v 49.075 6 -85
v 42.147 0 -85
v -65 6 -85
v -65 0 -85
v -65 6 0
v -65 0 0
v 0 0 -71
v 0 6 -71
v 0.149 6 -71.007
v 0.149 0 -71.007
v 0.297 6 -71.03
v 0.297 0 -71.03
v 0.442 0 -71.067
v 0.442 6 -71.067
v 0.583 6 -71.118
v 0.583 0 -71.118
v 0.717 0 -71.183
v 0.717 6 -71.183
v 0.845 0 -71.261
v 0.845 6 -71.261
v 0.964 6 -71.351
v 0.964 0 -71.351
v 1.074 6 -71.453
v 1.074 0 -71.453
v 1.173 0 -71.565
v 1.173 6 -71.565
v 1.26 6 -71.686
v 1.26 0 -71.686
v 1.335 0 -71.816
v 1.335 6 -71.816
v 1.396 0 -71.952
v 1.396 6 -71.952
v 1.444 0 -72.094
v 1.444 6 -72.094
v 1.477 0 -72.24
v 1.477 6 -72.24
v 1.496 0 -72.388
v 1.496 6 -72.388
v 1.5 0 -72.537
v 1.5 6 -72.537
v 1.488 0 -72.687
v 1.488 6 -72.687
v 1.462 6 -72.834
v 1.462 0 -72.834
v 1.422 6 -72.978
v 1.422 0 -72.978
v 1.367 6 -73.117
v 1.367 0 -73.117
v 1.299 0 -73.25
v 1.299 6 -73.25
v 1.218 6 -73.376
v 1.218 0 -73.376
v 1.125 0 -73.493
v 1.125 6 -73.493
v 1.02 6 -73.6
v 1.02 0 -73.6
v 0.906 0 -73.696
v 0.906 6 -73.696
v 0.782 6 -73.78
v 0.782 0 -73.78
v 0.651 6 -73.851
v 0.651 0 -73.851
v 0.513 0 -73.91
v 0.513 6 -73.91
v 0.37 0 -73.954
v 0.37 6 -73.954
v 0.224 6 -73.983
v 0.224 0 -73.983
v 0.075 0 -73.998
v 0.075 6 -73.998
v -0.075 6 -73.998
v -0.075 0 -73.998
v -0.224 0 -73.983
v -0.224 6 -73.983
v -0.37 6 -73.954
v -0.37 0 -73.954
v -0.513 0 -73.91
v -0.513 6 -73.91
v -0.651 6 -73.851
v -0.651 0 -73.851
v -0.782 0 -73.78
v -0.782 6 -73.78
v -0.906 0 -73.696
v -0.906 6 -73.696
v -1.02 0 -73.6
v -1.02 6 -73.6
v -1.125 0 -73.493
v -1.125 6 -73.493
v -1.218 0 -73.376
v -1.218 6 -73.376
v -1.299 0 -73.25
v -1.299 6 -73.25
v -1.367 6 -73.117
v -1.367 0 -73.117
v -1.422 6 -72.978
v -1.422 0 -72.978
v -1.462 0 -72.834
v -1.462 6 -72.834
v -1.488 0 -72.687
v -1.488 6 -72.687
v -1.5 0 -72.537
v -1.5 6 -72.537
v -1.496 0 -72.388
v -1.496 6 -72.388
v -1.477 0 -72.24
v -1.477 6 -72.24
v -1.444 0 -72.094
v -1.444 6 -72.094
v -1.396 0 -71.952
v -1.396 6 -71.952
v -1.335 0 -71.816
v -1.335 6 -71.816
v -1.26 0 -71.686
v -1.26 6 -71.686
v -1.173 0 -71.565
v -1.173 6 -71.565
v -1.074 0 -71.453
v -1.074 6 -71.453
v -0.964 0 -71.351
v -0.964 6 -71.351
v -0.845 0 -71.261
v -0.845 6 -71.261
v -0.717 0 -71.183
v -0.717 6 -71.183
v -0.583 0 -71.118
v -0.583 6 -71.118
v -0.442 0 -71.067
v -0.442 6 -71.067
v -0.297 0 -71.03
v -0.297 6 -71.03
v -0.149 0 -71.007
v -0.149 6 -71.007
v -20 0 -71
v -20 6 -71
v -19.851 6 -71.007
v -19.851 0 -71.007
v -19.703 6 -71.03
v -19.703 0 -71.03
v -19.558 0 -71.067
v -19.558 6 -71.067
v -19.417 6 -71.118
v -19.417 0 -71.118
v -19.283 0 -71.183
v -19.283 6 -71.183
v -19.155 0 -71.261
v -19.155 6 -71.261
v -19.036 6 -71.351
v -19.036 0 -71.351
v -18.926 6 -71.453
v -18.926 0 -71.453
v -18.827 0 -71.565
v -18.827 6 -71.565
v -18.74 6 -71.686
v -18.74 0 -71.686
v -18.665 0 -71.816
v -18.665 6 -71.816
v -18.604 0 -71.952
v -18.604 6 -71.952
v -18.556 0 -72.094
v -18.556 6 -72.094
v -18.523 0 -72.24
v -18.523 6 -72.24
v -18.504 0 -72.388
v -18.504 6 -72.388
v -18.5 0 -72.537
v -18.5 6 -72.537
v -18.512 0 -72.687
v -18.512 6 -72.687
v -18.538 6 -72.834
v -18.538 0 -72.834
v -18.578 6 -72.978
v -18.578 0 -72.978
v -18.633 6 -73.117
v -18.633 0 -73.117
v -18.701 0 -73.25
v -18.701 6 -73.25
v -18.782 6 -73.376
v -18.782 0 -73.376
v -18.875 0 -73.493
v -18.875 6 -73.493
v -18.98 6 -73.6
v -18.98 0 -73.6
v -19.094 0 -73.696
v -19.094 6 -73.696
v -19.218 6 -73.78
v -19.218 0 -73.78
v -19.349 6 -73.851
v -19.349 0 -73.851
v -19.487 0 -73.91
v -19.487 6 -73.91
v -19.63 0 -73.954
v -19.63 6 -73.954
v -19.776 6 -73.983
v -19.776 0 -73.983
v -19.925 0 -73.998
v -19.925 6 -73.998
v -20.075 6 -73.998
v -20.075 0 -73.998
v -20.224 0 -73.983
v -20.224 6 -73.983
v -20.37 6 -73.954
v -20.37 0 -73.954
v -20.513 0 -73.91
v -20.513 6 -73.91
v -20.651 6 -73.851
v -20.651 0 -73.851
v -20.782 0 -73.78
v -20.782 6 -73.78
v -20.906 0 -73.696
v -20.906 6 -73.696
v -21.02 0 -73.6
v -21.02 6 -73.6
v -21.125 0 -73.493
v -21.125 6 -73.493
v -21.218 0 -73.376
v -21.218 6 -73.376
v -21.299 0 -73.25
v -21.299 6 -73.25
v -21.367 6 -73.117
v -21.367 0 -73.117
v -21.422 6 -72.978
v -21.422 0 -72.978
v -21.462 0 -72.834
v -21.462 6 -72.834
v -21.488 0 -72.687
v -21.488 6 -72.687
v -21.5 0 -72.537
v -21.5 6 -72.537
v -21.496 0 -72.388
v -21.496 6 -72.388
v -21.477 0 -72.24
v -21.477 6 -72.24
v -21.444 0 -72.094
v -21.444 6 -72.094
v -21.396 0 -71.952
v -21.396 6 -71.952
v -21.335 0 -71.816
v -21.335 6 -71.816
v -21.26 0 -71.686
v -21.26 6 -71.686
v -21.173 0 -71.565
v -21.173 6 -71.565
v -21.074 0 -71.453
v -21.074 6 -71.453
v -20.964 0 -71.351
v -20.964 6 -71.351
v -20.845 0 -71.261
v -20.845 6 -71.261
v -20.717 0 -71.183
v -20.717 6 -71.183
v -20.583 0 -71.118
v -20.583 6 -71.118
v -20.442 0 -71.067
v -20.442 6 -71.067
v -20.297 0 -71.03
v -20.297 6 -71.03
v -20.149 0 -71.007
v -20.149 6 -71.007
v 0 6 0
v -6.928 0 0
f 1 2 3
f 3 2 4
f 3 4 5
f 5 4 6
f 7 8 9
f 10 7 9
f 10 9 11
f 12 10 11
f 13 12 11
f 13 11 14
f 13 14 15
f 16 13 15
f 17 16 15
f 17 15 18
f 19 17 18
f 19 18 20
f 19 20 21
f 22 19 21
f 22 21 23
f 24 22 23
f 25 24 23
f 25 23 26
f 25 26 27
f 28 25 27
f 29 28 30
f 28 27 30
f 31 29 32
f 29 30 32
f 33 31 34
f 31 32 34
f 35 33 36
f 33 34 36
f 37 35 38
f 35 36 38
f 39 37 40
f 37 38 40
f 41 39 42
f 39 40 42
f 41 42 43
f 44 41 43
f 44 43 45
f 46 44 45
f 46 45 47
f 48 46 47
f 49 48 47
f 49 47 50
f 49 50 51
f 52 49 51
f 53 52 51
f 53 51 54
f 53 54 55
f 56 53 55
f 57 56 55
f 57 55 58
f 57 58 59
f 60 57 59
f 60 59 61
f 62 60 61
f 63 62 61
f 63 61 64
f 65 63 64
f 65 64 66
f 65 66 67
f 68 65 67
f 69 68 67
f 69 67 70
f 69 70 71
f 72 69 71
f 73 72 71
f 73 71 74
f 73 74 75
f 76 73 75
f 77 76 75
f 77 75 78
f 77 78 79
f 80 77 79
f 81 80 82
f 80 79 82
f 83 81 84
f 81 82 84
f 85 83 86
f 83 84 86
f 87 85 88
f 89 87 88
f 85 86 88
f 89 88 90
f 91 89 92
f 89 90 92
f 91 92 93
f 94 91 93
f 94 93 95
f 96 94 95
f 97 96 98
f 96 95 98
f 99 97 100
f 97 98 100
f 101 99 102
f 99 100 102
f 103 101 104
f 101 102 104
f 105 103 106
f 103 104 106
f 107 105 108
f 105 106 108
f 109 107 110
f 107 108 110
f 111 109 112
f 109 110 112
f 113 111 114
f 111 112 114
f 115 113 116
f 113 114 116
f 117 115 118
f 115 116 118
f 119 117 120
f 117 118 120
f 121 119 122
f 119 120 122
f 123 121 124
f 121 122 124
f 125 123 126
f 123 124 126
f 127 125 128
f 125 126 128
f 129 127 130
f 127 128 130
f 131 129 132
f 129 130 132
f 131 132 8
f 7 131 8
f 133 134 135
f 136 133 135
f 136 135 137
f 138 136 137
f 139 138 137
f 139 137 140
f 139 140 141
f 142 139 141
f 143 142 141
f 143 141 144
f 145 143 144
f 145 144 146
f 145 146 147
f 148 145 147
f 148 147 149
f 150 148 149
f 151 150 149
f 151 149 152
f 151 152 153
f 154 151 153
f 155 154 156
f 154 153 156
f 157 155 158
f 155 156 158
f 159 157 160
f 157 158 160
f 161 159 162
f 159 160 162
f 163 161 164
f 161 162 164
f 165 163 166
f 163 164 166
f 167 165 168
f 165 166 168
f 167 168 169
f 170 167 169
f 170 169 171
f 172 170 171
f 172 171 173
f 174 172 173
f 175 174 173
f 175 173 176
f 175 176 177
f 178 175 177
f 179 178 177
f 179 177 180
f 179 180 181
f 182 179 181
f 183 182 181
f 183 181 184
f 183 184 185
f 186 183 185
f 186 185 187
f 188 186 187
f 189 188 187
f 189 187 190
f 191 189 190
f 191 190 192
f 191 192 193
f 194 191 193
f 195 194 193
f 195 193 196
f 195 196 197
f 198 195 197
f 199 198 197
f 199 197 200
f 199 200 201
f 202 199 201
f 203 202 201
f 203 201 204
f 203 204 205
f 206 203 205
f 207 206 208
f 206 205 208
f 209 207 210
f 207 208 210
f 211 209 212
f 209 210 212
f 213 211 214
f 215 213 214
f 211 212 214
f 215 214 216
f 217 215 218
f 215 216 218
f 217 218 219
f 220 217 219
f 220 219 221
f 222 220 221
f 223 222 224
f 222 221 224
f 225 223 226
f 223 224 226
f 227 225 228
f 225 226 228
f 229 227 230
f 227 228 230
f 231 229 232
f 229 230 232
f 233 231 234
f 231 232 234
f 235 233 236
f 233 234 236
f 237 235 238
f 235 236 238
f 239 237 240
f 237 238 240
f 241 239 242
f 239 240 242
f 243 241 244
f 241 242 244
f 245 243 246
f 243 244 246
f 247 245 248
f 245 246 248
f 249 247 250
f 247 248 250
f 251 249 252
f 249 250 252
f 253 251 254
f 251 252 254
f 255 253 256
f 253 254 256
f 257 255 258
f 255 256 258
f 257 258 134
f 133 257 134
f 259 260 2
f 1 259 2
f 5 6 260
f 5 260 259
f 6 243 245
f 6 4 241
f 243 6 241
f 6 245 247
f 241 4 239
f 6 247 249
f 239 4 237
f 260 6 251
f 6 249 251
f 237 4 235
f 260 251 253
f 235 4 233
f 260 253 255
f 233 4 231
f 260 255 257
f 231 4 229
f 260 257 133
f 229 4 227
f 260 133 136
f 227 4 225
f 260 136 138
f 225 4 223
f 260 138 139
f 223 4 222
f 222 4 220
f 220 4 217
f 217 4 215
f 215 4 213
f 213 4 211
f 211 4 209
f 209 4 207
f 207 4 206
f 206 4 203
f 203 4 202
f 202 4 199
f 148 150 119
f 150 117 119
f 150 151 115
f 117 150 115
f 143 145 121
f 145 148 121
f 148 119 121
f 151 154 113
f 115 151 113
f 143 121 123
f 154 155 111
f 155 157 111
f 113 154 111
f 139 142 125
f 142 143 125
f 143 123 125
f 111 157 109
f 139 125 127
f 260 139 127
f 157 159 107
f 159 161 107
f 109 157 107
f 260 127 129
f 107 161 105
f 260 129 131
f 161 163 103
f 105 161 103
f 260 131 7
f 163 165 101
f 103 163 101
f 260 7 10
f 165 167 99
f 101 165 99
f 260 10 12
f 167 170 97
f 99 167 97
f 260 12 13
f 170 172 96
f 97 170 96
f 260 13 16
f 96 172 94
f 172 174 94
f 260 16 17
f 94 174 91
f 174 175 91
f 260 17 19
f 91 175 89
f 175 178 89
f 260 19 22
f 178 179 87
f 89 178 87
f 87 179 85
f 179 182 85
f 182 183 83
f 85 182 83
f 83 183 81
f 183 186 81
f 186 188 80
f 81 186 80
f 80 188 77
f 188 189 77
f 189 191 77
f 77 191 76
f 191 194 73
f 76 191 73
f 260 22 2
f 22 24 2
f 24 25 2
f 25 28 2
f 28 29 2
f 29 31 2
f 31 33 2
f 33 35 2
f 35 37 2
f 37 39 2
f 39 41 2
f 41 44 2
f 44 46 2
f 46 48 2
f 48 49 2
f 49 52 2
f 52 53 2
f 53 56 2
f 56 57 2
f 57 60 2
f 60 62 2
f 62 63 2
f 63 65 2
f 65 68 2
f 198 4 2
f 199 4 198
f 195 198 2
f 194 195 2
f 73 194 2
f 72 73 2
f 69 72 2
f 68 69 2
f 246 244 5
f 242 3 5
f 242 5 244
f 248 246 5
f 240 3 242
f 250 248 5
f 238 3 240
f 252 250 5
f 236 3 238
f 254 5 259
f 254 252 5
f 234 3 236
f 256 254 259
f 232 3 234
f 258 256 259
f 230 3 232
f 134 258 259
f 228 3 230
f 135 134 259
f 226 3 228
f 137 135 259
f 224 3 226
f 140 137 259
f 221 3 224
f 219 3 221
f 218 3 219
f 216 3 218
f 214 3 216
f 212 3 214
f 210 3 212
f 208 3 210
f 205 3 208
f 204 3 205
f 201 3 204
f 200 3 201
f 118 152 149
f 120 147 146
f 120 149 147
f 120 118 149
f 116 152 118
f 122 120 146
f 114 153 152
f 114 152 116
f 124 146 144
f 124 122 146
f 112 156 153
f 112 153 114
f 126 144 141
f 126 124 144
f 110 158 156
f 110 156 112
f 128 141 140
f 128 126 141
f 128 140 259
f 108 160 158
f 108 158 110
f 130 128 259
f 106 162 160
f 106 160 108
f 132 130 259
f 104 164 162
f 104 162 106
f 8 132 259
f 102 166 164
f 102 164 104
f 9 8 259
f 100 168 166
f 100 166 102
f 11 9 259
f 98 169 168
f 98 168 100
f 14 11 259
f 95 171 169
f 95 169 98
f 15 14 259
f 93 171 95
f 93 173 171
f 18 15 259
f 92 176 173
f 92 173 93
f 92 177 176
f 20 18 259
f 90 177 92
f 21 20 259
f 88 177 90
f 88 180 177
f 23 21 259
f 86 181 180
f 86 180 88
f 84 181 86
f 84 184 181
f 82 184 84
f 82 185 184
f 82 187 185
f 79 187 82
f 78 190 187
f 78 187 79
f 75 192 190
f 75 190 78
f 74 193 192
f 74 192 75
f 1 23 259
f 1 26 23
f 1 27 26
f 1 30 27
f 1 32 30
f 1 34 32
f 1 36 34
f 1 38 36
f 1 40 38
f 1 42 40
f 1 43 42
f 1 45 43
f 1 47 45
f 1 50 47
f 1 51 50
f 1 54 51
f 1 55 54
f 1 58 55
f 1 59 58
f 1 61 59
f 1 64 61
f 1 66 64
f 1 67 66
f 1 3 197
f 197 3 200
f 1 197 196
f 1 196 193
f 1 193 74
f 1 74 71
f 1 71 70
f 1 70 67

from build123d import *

# Parameters (mm, degrees)
BOSS_EXTRUDE1_DEPTH = 6
SKETCH2_R           = 1.5
CUT_EXTRUDE1_DEPTH  = 108.172757733
CHAMFER1_SIZE       = 6


with BuildPart() as part:
    # Sketch1 → Boss-Extrude1 (new body)
    with BuildSketch(Plane(origin=(0, 0, 0), x_dir=(1, 0, 0), z_dir=(0, 1, 0))):
        Polygon((0, 0), (49.074772881, 85), (0, 85), (-65, 85), (-65, 0), align=None)
    extrude(amount=BOSS_EXTRUDE1_DEPTH)

    # Sketch2 → Cut-Extrude1 (cut, through all)
    with BuildSketch(Plane(origin=(0, 6, 0), x_dir=(1, 0, 0), z_dir=(0, 1, 0))):
        with Locations(Location((-20, 72.5, 0), (0, 0, 270))):
            Circle(SKETCH2_R)
        with Locations(Location((0, 72.5, 0), (0, 0, 270))):
            Circle(SKETCH2_R)
    extrude(amount=-CUT_EXTRUDE1_DEPTH, mode=Mode.SUBTRACT)

    # Chamfer1
    chamfer1_edges = [part.edges().sort_by_distance(p)[0] for p in [
        (24.537386441, 0, -42.5),
    ]]
    chamfer(chamfer1_edges, length=CHAMFER1_SIZE - 0.0001)  # a hair under: the kernel refuses the full size


solid = part.part
